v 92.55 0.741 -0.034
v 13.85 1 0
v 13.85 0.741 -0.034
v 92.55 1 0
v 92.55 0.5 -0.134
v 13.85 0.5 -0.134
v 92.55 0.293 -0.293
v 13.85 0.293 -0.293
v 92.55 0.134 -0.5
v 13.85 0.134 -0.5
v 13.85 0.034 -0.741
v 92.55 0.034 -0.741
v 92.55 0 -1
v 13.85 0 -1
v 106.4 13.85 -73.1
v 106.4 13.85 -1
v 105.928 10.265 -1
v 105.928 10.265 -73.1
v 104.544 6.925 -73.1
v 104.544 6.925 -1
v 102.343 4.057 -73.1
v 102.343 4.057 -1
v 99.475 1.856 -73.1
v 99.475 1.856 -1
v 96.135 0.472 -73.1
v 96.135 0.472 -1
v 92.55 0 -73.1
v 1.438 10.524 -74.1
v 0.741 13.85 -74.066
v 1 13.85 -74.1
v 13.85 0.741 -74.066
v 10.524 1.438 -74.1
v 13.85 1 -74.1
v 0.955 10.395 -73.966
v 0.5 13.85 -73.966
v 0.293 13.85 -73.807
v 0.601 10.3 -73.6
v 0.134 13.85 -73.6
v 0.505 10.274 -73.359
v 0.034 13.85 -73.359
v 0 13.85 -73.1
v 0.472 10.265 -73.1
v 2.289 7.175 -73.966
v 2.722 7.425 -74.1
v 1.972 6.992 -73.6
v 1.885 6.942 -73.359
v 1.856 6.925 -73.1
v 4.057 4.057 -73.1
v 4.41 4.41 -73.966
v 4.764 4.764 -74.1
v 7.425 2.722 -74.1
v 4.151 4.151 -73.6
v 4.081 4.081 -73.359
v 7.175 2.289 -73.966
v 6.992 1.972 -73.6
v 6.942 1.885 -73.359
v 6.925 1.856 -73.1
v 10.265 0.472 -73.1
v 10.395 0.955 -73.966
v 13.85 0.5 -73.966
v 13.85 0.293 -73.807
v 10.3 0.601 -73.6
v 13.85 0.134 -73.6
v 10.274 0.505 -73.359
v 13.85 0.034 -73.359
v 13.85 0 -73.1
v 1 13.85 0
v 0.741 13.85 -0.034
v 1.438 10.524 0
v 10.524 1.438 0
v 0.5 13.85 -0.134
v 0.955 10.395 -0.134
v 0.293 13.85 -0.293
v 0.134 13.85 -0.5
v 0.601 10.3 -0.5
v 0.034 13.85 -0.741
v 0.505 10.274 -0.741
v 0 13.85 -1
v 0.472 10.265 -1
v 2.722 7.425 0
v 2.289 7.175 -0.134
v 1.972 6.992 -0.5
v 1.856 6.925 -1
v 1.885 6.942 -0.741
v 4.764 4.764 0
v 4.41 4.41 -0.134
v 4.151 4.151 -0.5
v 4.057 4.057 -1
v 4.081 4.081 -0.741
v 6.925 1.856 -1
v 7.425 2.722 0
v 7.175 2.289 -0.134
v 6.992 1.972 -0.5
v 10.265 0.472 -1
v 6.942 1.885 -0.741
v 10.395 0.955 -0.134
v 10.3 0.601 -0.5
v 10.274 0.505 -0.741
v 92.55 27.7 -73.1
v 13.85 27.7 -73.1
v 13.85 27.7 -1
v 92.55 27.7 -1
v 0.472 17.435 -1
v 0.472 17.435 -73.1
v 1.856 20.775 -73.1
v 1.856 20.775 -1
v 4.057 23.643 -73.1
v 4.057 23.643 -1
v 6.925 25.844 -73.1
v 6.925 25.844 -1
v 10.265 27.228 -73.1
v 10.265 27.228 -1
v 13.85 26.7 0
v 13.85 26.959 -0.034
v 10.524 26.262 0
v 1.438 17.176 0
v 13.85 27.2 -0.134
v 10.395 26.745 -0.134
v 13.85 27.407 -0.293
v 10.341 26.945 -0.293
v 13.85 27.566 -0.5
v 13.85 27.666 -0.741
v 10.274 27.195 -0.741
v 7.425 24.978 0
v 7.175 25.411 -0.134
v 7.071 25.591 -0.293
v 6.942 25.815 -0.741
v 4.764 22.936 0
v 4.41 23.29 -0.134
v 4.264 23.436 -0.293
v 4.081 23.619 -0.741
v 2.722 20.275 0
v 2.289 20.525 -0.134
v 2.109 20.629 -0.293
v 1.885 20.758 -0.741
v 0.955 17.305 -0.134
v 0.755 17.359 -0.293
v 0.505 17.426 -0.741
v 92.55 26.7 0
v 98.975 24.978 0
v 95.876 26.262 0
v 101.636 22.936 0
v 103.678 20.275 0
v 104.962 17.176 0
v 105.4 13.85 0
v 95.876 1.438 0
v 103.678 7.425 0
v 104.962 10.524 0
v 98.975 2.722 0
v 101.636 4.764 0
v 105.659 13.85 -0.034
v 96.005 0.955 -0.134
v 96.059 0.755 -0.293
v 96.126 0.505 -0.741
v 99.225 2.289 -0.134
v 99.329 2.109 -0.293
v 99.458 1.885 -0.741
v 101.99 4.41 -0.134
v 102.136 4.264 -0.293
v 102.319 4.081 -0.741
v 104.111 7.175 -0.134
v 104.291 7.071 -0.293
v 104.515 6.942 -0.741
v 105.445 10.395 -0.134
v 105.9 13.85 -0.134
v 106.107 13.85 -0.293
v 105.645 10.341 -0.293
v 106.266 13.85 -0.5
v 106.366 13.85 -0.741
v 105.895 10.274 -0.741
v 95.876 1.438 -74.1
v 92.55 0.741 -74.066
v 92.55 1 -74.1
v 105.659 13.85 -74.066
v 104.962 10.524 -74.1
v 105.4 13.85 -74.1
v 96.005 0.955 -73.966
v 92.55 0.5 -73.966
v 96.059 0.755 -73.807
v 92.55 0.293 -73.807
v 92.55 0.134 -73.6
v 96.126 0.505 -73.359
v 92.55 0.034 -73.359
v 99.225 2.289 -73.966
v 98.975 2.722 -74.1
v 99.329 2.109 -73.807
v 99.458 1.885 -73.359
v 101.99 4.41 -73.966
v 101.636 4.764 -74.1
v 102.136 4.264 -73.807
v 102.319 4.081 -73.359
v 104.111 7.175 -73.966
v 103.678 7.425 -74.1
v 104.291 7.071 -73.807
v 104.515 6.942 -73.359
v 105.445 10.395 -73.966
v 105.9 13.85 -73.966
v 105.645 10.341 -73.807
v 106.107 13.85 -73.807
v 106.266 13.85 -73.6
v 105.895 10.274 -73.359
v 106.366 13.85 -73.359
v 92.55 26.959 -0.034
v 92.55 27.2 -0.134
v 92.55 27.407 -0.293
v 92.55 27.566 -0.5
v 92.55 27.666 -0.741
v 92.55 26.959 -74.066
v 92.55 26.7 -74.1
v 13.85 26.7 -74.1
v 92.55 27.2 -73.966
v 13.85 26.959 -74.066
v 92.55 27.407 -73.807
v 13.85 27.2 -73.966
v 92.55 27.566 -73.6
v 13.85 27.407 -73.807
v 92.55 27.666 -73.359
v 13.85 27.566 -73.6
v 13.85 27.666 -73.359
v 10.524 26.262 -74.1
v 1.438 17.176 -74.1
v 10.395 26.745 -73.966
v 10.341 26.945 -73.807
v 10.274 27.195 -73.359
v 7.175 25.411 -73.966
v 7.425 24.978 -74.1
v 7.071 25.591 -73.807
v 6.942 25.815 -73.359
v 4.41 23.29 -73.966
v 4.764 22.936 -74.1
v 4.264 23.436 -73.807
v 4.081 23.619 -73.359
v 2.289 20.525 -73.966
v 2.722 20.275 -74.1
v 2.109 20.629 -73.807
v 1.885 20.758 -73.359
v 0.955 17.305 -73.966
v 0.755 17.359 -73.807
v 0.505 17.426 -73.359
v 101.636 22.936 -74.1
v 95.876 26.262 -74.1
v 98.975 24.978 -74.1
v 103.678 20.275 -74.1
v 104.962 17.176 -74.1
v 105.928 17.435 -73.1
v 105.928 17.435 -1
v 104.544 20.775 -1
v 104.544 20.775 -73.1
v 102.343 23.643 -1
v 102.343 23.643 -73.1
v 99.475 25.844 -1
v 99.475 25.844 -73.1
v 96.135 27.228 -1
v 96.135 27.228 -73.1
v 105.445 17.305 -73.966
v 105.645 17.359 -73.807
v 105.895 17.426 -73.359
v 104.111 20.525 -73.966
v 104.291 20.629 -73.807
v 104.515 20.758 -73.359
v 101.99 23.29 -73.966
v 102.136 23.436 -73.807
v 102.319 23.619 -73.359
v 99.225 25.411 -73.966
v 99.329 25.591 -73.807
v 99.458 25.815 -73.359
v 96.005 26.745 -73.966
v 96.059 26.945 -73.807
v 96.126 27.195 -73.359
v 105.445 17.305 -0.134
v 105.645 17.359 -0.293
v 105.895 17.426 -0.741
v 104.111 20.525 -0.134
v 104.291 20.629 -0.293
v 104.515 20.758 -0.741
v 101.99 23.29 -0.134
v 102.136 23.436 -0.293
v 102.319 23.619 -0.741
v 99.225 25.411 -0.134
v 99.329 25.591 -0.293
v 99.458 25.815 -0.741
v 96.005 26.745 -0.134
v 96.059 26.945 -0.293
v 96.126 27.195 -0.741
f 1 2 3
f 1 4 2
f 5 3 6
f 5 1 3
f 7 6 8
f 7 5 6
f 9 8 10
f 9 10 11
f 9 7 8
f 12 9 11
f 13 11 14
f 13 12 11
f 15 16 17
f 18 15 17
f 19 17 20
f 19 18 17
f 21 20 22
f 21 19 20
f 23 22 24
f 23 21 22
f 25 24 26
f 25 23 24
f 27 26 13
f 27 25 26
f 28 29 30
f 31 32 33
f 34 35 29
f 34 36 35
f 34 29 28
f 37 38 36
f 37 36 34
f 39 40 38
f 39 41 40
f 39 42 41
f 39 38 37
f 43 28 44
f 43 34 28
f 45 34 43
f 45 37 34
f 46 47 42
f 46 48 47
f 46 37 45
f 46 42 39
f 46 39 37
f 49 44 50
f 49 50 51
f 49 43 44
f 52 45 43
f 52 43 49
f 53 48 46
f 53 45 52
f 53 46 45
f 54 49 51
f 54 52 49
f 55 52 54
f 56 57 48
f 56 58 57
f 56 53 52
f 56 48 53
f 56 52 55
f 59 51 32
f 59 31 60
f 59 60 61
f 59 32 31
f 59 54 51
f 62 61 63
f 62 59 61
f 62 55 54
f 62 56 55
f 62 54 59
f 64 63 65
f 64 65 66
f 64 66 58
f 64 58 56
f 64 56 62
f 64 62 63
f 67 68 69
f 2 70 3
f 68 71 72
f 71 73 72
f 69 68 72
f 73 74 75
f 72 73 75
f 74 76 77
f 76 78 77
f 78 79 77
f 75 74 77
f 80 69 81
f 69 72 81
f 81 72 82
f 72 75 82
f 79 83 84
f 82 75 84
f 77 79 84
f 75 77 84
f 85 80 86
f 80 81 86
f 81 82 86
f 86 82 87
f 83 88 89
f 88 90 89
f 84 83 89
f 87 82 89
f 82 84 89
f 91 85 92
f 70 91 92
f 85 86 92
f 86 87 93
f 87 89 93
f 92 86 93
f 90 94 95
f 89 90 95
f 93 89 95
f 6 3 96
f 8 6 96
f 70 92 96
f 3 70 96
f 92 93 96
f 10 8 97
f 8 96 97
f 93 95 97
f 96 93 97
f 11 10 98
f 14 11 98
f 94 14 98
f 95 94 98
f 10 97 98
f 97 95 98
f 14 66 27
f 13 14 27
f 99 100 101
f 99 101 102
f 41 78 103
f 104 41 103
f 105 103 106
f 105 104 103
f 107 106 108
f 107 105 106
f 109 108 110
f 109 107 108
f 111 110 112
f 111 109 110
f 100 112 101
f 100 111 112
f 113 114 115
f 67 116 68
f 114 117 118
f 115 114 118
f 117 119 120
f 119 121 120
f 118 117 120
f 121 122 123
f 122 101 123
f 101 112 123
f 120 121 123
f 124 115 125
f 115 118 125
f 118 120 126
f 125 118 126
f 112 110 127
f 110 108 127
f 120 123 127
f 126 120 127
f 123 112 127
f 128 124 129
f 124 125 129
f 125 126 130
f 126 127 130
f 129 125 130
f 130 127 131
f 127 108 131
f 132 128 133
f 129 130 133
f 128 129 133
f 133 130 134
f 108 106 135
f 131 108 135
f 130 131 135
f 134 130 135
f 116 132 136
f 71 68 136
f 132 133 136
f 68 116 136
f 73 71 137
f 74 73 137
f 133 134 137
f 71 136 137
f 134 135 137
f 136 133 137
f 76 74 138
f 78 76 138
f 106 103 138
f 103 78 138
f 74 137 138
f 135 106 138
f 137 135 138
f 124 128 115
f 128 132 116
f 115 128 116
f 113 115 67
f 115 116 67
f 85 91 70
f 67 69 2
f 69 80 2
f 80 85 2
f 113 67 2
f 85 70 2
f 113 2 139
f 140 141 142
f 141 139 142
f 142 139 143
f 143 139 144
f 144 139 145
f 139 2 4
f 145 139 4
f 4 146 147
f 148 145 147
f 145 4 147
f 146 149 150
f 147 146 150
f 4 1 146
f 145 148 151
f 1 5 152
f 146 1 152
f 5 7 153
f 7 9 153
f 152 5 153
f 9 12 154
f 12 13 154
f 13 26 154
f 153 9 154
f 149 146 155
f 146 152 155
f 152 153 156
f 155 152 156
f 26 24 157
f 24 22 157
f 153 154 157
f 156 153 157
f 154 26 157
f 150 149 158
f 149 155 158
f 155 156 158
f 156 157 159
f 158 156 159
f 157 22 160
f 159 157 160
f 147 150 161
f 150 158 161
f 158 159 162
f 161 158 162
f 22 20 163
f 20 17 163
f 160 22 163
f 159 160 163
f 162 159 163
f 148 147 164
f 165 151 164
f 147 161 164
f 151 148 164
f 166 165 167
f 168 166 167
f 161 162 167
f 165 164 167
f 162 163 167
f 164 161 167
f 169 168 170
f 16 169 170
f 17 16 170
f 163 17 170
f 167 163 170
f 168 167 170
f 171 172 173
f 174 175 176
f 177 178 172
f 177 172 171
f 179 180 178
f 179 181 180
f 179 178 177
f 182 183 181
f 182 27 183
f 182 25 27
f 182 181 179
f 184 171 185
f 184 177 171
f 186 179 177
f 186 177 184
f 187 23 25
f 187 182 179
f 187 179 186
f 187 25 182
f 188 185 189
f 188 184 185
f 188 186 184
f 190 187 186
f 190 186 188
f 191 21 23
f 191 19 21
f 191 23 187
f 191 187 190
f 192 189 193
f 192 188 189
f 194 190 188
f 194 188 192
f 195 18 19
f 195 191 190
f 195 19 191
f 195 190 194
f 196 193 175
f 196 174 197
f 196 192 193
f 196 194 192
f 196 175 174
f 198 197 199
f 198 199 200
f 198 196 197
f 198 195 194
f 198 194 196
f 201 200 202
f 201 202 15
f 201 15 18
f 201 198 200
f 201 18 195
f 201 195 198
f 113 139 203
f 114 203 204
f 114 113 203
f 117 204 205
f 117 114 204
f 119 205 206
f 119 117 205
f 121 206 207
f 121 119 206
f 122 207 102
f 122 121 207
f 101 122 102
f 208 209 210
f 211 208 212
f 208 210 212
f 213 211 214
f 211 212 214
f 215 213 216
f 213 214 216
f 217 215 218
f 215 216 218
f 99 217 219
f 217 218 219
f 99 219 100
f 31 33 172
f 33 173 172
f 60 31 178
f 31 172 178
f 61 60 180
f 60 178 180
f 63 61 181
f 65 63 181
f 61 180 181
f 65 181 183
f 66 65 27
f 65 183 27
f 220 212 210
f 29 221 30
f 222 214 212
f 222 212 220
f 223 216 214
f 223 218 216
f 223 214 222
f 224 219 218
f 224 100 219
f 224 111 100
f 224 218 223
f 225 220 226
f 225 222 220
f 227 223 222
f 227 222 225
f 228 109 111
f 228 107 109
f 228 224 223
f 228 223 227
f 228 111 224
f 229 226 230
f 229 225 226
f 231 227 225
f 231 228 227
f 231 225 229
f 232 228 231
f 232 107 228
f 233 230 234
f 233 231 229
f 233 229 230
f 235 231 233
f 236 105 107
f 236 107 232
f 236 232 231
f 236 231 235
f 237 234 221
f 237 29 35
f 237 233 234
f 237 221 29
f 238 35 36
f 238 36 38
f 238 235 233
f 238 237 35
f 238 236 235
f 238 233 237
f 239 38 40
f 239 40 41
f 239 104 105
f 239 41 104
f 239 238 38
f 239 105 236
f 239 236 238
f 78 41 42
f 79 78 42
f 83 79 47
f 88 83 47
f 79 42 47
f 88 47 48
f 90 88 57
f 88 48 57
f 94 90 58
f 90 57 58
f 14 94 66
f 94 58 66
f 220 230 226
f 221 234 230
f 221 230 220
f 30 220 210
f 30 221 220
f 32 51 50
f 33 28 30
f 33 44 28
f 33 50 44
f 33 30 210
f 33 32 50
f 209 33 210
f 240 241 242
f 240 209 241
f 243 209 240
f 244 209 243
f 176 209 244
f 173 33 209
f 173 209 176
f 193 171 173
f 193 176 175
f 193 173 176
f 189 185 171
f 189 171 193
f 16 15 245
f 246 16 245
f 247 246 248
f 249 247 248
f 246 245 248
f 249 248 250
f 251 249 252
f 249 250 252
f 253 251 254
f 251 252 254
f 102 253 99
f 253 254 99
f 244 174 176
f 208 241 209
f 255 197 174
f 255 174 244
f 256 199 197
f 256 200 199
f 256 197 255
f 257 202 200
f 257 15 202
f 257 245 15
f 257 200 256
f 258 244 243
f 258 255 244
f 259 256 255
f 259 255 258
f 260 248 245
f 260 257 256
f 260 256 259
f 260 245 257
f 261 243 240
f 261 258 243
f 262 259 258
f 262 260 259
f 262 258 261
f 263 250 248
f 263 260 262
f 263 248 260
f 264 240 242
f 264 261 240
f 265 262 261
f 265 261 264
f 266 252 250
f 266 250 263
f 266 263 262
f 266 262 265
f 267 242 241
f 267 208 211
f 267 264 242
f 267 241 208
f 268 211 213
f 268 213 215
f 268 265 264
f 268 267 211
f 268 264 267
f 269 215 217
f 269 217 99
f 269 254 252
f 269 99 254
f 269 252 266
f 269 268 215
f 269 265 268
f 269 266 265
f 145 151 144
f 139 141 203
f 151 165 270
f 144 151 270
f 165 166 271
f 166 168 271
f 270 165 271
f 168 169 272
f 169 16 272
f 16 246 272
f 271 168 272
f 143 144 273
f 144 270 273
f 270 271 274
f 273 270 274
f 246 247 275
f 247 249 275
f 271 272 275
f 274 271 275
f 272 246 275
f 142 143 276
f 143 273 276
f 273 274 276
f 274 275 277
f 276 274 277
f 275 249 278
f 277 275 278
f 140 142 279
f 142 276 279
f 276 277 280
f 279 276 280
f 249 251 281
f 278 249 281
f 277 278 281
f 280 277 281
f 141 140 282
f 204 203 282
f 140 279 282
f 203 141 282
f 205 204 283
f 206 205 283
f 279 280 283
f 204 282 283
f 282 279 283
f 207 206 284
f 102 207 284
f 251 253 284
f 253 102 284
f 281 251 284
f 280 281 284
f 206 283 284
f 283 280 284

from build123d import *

# Parameters (mm, degrees)
ESQUISSE1_W        = 106.4
ESQUISSE1_H        = 74.1
BOSS_EXTRU_1_DEPTH = 27.7
CONG_2_R           = 13.85
CONG_3_R           = 1


with BuildPart() as part:
    # Esquisse1 → Boss.-Extru.1 (new body)
    with BuildSketch(Plane(origin=(0, 0, 0), x_dir=(1, 0, 0), z_dir=(0, 1, 0))):
        with Locations((53.2, 37.05)):
            Rectangle(ESQUISSE1_W, ESQUISSE1_H)
    extrude(amount=BOSS_EXTRU_1_DEPTH)

    # Congé2
    cong_2_edges = [part.edges().sort_by_distance(p)[0] for p in [
        (0, 0, -37.05),
        (0, 27.7, -37.05),
        (106.4, 27.7, -37.05),
        (106.4, 0, -37.05),
    ]]
    fillet(cong_2_edges, radius=CONG_2_R - 0.0001)  # a hair under: the kernel refuses the full size

    # Congé3
    cong_3_edges = [part.edges().sort_by_distance(p)[0] for p in [
        (53.2, 0, 0),
        (53.2, 27.7, 0),
        (102.343458209, 4.056541791, 0),
        (102.343458209, 23.643458209, 0),
        (4.056541791, 23.643458209, 0),
        (4.056541791, 4.056541791, 0),
        (53.2, 0, -74.1),
        (53.2, 27.7, -74.1),
        (102.343458209, 4.056541791, -74.1),
        (102.343458209, 23.643458209, -74.1),
        (4.056541791, 23.643458209, -74.1),
        (4.056541791, 4.056541791, -74.1),
    ]]
    fillet(cong_3_edges, radius=CONG_3_R)


solid = part.part
